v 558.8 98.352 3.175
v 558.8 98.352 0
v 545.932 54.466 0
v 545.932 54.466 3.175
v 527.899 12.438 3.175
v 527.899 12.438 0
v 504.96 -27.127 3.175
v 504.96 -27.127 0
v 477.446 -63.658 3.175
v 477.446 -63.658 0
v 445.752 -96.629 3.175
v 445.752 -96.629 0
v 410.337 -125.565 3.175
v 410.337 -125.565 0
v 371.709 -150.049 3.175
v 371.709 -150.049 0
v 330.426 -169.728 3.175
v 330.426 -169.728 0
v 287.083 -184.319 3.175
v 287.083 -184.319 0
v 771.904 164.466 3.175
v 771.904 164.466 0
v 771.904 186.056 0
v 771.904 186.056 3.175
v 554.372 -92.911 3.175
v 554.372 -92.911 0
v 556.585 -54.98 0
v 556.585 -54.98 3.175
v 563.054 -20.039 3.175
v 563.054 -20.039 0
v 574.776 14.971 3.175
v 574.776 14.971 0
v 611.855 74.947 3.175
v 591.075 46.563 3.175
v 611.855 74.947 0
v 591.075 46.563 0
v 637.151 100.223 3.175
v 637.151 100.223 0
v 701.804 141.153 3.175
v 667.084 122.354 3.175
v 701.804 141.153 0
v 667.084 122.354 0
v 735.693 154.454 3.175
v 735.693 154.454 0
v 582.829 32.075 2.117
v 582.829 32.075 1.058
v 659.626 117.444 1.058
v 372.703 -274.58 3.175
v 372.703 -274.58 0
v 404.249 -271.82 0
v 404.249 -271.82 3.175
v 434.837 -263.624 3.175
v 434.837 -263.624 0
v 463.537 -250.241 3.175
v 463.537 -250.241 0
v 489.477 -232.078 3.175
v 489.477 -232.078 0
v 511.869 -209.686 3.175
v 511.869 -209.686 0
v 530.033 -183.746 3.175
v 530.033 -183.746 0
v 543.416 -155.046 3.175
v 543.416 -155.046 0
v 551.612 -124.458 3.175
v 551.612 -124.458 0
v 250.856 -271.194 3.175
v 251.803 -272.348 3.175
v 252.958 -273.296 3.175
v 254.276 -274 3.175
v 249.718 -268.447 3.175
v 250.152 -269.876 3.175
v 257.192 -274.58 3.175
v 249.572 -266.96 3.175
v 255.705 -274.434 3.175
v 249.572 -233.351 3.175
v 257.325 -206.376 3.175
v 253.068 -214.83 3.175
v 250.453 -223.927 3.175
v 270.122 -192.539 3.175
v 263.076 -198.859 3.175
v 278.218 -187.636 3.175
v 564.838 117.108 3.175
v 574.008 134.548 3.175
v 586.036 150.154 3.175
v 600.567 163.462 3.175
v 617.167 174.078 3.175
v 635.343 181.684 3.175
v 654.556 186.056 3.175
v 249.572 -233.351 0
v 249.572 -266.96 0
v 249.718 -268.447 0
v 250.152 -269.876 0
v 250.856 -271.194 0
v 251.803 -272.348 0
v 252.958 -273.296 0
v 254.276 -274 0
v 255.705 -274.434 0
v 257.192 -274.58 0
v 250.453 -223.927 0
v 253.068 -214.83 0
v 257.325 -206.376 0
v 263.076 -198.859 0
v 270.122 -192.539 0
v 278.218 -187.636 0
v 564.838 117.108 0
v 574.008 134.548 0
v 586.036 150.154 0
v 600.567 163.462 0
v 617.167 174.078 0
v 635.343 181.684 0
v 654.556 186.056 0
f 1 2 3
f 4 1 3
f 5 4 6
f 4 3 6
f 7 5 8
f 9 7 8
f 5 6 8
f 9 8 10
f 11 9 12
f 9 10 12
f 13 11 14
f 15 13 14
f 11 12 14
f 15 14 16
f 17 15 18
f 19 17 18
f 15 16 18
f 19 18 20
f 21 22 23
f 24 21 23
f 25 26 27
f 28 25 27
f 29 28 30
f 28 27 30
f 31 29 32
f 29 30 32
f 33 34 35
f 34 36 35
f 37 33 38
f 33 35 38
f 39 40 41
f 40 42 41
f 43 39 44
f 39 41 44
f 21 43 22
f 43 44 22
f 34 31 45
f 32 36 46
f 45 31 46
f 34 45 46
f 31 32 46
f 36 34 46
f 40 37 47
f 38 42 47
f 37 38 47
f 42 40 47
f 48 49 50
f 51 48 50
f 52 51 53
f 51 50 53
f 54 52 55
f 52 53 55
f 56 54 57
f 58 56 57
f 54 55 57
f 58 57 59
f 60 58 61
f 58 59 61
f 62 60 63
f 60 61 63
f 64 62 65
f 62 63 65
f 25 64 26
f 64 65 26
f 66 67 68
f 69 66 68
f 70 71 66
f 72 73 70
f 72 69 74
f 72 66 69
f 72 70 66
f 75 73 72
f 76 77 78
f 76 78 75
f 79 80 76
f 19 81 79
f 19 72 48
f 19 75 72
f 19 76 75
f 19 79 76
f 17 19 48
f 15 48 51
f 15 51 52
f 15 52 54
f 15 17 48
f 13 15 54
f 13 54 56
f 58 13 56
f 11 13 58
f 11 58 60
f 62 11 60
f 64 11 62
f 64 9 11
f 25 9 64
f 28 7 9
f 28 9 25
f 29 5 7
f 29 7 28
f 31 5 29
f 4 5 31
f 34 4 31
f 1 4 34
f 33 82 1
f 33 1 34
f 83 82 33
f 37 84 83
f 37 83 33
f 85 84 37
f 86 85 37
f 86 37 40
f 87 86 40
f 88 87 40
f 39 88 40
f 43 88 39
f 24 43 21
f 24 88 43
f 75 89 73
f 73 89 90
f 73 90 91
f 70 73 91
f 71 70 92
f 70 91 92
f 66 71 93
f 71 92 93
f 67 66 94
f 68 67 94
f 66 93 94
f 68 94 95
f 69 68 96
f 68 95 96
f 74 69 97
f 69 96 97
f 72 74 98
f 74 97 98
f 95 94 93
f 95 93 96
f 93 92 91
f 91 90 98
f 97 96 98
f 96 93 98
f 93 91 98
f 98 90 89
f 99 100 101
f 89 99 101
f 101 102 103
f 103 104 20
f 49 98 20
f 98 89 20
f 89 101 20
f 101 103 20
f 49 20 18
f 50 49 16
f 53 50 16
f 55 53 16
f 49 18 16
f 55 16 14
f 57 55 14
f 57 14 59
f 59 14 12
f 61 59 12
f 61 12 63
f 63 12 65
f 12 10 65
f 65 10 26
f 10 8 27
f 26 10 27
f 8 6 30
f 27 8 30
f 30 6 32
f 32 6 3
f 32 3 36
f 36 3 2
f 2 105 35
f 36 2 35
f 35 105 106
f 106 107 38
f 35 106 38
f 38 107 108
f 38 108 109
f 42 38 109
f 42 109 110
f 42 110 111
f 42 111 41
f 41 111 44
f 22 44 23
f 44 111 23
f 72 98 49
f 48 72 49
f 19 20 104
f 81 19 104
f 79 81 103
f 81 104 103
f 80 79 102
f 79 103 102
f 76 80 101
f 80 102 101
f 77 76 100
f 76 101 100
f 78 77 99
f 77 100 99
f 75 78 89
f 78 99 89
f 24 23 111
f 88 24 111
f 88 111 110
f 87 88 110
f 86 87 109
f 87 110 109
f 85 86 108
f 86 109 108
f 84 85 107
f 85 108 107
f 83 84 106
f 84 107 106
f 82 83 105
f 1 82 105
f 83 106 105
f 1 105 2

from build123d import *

# Parameters (mm, degrees)
BOSS_EXTRUDE1_DEPTH = 3.175


with BuildPart() as part:
    # Sketch1 → Boss-Extrude1 (new body)
    with BuildSketch(Plane.XY):
        with BuildLine():
            Line((771.903793001, 164.465805668), (771.903793001, 186.055805664))
            Line((771.903793001, 186.055805664), (654.555793001, 186.055805664))
            ThreePointArc((654.555793001, 186.055805664), (593.014276043, 157.121992999), (558.8, 98.352042006))
            ThreePointArc((558.8, 98.352042006), (462.094129135, -80.619143391), (287.082829619, -184.319460189))
            ThreePointArc((287.082829619, -184.319460189), (260.024944938, -202.483344486), (249.571639661, -233.350547549))
            Line((249.571639661, -233.350547549), (249.571639661, -266.960111933))
            ThreePointArc((249.571639661, -266.960111933), (251.803485989, -272.348265606), (257.191639661, -274.580111933))
            Line((257.191639661, -274.580111933), (372.702998231, -274.580111933))
            ThreePointArc((372.702998231, -274.580111933), (501.162126515, -221.370598787), (554.371639661, -92.911470503))
            add(Edge.make_bspline(
                [(554.371639661, -92.911470503), (554.371639661, 52.307938416), (646.172603674, 136.193906474), (771.903793001, 164.465805668)],
                knots=[0, 0, 0, 0, 1, 1, 1, 1], degree=3))
        make_face()
    extrude(amount=BOSS_EXTRUDE1_DEPTH)


solid = part.part
